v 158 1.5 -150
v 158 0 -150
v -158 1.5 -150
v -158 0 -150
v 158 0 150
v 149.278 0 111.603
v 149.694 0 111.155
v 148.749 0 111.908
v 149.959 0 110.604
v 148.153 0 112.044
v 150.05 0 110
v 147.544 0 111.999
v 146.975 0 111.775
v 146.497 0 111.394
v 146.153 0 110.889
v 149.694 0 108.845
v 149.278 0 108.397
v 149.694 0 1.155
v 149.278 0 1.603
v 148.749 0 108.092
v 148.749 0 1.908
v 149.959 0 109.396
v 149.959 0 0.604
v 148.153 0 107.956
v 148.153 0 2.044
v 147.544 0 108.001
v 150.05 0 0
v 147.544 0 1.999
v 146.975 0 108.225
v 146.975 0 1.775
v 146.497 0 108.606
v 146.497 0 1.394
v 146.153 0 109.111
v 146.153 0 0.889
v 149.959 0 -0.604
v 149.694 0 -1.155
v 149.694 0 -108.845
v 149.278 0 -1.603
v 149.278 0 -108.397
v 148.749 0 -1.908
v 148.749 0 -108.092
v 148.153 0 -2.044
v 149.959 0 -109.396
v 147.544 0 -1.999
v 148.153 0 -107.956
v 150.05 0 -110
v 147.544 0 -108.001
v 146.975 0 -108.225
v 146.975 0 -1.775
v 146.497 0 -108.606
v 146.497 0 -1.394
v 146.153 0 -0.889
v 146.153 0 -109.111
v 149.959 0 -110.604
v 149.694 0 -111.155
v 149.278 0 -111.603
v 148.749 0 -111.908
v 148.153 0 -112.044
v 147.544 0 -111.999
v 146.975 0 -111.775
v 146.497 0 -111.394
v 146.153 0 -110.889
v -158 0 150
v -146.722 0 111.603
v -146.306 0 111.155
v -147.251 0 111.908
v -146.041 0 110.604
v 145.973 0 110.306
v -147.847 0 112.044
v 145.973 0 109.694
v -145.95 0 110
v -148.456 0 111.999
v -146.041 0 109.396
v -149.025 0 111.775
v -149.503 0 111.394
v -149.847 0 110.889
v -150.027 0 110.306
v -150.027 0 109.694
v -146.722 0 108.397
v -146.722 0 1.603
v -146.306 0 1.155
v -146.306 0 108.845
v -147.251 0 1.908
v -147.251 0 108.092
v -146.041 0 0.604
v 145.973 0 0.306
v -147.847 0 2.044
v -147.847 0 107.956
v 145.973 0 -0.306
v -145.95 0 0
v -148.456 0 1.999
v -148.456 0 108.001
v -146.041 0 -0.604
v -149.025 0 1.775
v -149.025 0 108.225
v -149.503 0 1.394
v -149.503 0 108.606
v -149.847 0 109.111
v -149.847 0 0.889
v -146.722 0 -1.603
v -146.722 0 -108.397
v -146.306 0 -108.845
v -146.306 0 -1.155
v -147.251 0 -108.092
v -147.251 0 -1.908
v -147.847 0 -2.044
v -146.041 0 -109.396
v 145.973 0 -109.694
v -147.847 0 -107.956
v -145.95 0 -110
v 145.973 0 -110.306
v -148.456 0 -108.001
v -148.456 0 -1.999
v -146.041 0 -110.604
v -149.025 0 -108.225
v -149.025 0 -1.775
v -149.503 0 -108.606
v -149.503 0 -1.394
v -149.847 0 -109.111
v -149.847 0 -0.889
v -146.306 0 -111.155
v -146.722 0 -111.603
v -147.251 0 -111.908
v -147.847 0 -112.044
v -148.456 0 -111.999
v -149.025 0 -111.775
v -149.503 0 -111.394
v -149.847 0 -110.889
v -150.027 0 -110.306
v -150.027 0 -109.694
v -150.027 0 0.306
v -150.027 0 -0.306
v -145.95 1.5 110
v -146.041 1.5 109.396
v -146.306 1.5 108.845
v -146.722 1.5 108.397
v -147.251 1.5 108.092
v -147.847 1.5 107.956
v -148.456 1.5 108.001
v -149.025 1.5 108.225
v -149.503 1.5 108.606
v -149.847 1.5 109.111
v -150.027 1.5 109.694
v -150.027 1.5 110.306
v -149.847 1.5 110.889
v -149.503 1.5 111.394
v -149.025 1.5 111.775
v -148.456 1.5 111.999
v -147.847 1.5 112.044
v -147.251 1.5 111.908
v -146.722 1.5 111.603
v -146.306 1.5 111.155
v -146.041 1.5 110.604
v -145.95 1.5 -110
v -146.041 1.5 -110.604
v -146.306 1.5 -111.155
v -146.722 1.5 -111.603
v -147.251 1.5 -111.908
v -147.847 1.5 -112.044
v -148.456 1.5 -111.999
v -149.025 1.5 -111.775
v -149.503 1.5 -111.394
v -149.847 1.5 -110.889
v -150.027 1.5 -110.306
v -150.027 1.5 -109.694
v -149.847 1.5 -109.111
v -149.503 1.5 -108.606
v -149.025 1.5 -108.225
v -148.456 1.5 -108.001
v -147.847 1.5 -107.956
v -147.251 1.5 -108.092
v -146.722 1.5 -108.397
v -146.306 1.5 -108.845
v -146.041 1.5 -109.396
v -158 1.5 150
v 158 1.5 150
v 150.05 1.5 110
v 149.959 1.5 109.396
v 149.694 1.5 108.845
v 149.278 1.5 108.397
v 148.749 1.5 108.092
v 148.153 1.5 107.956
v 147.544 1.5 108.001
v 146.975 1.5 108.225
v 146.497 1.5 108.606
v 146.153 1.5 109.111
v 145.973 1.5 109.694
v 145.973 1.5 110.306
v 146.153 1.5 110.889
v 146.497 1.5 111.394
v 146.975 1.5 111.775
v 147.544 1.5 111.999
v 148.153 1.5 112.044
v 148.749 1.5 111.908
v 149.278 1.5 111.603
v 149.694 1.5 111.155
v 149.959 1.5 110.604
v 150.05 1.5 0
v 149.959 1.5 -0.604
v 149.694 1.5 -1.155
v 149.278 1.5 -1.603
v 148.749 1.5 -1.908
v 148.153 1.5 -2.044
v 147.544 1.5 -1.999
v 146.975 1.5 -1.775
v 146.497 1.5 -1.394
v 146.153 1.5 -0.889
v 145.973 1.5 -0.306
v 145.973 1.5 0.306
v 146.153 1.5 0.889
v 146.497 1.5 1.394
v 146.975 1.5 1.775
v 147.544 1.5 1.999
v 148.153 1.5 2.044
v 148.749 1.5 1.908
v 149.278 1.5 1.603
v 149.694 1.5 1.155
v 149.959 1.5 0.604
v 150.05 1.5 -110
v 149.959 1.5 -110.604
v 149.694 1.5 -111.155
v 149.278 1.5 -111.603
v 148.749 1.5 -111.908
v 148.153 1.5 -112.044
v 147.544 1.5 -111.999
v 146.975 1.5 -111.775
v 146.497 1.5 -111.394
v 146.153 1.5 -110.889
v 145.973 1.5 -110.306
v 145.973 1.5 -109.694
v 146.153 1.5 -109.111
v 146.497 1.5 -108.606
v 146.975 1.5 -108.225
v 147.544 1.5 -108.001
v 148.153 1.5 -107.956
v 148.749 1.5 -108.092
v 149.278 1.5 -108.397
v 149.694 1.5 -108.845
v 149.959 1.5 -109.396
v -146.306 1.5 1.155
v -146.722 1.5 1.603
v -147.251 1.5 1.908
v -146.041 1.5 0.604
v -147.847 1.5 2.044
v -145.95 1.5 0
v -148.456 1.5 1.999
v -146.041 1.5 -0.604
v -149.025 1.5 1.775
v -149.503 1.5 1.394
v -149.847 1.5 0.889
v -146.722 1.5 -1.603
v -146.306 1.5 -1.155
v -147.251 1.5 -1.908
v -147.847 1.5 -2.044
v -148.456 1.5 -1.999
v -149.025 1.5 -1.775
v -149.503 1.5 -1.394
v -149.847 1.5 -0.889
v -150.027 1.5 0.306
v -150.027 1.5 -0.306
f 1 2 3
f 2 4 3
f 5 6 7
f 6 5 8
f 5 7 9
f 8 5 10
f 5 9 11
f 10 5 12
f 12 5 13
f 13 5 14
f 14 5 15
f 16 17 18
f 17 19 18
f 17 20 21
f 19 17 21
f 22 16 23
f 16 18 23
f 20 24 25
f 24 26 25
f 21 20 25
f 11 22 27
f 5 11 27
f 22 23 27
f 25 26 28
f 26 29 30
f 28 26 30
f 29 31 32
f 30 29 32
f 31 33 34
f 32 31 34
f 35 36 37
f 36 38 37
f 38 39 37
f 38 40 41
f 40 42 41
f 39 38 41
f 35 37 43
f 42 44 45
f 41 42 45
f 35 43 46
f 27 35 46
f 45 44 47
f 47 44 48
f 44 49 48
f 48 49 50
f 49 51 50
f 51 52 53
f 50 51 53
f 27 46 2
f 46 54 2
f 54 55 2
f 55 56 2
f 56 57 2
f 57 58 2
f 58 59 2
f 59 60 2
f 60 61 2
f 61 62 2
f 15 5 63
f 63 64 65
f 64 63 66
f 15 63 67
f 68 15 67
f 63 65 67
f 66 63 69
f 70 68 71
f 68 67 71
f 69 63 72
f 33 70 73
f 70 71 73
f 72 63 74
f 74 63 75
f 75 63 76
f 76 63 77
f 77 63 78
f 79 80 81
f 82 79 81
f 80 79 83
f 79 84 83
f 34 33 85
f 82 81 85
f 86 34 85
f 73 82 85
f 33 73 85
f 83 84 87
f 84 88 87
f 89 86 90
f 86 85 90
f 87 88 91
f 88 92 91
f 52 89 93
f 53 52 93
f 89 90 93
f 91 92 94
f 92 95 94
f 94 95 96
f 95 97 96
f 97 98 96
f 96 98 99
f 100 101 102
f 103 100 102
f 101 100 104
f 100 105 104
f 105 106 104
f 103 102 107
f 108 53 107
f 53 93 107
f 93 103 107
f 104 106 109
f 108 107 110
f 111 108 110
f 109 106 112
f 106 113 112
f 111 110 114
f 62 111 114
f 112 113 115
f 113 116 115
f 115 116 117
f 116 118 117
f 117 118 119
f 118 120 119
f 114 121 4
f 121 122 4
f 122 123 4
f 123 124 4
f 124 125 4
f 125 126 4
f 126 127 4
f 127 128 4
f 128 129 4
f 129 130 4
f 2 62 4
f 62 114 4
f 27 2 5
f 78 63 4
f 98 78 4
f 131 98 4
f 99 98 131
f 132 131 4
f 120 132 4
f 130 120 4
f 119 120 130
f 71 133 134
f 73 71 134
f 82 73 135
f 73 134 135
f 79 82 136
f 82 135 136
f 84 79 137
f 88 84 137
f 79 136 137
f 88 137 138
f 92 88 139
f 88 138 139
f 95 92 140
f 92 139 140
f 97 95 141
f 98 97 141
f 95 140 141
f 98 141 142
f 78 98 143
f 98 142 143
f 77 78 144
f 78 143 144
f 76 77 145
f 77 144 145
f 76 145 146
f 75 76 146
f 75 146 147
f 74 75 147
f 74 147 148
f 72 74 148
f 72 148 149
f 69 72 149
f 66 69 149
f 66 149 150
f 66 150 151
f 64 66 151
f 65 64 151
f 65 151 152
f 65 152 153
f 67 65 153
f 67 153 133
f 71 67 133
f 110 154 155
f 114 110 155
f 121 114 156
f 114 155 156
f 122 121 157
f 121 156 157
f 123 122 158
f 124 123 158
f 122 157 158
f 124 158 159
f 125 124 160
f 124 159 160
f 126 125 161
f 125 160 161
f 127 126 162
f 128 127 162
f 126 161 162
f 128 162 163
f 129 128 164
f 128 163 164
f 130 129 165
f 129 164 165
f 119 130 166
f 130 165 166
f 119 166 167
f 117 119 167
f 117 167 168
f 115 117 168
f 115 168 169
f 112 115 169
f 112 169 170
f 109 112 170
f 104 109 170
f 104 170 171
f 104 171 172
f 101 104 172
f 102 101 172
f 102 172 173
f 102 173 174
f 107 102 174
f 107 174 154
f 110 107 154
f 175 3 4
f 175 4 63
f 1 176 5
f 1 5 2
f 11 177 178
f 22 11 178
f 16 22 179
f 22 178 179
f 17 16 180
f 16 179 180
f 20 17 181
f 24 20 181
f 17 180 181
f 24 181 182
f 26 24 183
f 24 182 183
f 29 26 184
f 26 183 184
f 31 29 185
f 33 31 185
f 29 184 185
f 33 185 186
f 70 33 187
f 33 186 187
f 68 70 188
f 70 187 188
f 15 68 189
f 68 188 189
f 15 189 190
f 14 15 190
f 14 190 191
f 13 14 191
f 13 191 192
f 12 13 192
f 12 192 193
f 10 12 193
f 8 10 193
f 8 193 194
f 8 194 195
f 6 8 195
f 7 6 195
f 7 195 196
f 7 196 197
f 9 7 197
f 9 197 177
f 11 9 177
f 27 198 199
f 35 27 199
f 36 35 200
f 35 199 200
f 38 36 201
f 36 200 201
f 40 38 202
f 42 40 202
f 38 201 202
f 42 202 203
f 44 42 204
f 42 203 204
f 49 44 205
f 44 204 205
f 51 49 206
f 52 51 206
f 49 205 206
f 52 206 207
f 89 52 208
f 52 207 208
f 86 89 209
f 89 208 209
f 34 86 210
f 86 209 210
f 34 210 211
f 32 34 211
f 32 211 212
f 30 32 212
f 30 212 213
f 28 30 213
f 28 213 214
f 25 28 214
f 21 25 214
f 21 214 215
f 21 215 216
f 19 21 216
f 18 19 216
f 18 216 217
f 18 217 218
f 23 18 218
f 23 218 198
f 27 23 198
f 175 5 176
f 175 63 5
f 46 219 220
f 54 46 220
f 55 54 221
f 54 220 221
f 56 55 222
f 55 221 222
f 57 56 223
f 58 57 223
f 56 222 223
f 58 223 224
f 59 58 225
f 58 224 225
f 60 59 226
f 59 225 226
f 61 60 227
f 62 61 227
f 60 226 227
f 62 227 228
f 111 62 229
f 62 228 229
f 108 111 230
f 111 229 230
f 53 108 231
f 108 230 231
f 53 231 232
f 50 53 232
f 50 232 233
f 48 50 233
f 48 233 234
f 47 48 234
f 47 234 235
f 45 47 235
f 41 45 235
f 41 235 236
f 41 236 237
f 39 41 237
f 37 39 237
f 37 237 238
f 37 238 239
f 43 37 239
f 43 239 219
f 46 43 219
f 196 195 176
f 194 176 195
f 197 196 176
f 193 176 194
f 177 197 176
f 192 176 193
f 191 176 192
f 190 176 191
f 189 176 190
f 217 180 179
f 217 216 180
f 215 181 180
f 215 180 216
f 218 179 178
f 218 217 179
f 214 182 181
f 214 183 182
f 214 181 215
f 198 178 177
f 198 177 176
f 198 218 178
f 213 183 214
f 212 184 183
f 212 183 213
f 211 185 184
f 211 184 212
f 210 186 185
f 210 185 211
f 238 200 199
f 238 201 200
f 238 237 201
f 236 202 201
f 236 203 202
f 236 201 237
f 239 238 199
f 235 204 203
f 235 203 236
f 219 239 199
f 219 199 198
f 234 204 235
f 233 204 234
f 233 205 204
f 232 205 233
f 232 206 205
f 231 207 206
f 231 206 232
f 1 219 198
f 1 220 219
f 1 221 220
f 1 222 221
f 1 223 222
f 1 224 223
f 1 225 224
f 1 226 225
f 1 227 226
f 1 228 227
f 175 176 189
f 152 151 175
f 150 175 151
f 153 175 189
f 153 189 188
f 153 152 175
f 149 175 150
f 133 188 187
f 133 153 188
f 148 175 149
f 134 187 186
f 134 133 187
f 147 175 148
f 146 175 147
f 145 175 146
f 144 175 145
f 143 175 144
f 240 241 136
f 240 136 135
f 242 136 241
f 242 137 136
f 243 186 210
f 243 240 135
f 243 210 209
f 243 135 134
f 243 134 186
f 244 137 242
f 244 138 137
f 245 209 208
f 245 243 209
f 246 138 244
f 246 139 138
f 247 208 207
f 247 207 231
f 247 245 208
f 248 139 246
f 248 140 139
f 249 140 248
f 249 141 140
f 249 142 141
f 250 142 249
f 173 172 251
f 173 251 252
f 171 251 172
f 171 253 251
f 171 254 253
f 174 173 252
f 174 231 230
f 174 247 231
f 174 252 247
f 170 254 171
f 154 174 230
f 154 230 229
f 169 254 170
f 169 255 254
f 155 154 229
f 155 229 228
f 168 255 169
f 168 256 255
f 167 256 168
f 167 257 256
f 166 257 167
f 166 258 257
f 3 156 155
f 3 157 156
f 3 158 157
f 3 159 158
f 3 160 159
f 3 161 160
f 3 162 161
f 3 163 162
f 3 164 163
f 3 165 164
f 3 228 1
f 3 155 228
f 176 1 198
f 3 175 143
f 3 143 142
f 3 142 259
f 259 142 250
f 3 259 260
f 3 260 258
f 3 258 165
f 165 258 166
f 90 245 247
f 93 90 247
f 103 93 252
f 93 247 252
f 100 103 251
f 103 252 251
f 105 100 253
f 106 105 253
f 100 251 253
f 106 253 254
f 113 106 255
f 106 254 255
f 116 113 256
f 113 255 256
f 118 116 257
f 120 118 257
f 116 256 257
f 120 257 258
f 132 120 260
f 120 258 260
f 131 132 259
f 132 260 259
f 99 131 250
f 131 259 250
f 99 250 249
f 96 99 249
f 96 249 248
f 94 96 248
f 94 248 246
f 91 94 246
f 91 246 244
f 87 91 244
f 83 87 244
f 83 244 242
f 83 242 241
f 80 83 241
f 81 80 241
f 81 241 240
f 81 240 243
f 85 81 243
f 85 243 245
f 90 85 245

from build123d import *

# Parameters (mm, degrees)
SKETCH1_W                  = 276
SKETCH1_H                  = 300
BOSS_EXTRUDE1_DEPTH        = 1.5
SKETCH3_W                  = 300
SKETCH3_H                  = 1.5
BOSS_EXTRUDE3_DEPTH        = 20
SKETCH4_W                  = 300
SKETCH4_H                  = 1.5
BOSS_EXTRUDE4_DEPTH        = 20
F_4_1_4_1_DIAMETER_HOLE1_D = 4.1


with BuildPart() as part:
    # Sketch1 → Boss-Extrude1 (new body)
    with BuildSketch(Plane(origin=(0, 0, 0), x_dir=(1, 0, 0), z_dir=(0, 1, 0))):
        Rectangle(SKETCH1_W, SKETCH1_H)
    extrude(amount=BOSS_EXTRUDE1_DEPTH)

    # Sketch3 → Boss-Extrude3 (add)
    with BuildSketch(Plane.ZY.offset(138)):
        with Locations((0, 0.75)):
            Rectangle(SKETCH3_W, SKETCH3_H)
    extrude(amount=BOSS_EXTRUDE3_DEPTH)

    # Sketch4 → Boss-Extrude4 (add)
    with BuildSketch(Plane(origin=(138, 0, 0), x_dir=(0, 0, -1), z_dir=(1, 0, 0))):
        with Locations((0, 0.75)):
            Rectangle(SKETCH4_W, SKETCH4_H)
    extrude(amount=BOSS_EXTRUDE4_DEPTH)

    # Ø4.1 (4.1) Diameter Hole1 (through all)
    with Locations(Plane(origin=(0, 0, 0), x_dir=(-1, 0, 0), z_dir=(0, -1, 0))):
        with Locations((-148, 110), (-148, 0), (-148, -110), (148, 0), (148, -110), (148, 110)):
            Hole(F_4_1_4_1_DIAMETER_HOLE1_D / 2)


solid = part.part
